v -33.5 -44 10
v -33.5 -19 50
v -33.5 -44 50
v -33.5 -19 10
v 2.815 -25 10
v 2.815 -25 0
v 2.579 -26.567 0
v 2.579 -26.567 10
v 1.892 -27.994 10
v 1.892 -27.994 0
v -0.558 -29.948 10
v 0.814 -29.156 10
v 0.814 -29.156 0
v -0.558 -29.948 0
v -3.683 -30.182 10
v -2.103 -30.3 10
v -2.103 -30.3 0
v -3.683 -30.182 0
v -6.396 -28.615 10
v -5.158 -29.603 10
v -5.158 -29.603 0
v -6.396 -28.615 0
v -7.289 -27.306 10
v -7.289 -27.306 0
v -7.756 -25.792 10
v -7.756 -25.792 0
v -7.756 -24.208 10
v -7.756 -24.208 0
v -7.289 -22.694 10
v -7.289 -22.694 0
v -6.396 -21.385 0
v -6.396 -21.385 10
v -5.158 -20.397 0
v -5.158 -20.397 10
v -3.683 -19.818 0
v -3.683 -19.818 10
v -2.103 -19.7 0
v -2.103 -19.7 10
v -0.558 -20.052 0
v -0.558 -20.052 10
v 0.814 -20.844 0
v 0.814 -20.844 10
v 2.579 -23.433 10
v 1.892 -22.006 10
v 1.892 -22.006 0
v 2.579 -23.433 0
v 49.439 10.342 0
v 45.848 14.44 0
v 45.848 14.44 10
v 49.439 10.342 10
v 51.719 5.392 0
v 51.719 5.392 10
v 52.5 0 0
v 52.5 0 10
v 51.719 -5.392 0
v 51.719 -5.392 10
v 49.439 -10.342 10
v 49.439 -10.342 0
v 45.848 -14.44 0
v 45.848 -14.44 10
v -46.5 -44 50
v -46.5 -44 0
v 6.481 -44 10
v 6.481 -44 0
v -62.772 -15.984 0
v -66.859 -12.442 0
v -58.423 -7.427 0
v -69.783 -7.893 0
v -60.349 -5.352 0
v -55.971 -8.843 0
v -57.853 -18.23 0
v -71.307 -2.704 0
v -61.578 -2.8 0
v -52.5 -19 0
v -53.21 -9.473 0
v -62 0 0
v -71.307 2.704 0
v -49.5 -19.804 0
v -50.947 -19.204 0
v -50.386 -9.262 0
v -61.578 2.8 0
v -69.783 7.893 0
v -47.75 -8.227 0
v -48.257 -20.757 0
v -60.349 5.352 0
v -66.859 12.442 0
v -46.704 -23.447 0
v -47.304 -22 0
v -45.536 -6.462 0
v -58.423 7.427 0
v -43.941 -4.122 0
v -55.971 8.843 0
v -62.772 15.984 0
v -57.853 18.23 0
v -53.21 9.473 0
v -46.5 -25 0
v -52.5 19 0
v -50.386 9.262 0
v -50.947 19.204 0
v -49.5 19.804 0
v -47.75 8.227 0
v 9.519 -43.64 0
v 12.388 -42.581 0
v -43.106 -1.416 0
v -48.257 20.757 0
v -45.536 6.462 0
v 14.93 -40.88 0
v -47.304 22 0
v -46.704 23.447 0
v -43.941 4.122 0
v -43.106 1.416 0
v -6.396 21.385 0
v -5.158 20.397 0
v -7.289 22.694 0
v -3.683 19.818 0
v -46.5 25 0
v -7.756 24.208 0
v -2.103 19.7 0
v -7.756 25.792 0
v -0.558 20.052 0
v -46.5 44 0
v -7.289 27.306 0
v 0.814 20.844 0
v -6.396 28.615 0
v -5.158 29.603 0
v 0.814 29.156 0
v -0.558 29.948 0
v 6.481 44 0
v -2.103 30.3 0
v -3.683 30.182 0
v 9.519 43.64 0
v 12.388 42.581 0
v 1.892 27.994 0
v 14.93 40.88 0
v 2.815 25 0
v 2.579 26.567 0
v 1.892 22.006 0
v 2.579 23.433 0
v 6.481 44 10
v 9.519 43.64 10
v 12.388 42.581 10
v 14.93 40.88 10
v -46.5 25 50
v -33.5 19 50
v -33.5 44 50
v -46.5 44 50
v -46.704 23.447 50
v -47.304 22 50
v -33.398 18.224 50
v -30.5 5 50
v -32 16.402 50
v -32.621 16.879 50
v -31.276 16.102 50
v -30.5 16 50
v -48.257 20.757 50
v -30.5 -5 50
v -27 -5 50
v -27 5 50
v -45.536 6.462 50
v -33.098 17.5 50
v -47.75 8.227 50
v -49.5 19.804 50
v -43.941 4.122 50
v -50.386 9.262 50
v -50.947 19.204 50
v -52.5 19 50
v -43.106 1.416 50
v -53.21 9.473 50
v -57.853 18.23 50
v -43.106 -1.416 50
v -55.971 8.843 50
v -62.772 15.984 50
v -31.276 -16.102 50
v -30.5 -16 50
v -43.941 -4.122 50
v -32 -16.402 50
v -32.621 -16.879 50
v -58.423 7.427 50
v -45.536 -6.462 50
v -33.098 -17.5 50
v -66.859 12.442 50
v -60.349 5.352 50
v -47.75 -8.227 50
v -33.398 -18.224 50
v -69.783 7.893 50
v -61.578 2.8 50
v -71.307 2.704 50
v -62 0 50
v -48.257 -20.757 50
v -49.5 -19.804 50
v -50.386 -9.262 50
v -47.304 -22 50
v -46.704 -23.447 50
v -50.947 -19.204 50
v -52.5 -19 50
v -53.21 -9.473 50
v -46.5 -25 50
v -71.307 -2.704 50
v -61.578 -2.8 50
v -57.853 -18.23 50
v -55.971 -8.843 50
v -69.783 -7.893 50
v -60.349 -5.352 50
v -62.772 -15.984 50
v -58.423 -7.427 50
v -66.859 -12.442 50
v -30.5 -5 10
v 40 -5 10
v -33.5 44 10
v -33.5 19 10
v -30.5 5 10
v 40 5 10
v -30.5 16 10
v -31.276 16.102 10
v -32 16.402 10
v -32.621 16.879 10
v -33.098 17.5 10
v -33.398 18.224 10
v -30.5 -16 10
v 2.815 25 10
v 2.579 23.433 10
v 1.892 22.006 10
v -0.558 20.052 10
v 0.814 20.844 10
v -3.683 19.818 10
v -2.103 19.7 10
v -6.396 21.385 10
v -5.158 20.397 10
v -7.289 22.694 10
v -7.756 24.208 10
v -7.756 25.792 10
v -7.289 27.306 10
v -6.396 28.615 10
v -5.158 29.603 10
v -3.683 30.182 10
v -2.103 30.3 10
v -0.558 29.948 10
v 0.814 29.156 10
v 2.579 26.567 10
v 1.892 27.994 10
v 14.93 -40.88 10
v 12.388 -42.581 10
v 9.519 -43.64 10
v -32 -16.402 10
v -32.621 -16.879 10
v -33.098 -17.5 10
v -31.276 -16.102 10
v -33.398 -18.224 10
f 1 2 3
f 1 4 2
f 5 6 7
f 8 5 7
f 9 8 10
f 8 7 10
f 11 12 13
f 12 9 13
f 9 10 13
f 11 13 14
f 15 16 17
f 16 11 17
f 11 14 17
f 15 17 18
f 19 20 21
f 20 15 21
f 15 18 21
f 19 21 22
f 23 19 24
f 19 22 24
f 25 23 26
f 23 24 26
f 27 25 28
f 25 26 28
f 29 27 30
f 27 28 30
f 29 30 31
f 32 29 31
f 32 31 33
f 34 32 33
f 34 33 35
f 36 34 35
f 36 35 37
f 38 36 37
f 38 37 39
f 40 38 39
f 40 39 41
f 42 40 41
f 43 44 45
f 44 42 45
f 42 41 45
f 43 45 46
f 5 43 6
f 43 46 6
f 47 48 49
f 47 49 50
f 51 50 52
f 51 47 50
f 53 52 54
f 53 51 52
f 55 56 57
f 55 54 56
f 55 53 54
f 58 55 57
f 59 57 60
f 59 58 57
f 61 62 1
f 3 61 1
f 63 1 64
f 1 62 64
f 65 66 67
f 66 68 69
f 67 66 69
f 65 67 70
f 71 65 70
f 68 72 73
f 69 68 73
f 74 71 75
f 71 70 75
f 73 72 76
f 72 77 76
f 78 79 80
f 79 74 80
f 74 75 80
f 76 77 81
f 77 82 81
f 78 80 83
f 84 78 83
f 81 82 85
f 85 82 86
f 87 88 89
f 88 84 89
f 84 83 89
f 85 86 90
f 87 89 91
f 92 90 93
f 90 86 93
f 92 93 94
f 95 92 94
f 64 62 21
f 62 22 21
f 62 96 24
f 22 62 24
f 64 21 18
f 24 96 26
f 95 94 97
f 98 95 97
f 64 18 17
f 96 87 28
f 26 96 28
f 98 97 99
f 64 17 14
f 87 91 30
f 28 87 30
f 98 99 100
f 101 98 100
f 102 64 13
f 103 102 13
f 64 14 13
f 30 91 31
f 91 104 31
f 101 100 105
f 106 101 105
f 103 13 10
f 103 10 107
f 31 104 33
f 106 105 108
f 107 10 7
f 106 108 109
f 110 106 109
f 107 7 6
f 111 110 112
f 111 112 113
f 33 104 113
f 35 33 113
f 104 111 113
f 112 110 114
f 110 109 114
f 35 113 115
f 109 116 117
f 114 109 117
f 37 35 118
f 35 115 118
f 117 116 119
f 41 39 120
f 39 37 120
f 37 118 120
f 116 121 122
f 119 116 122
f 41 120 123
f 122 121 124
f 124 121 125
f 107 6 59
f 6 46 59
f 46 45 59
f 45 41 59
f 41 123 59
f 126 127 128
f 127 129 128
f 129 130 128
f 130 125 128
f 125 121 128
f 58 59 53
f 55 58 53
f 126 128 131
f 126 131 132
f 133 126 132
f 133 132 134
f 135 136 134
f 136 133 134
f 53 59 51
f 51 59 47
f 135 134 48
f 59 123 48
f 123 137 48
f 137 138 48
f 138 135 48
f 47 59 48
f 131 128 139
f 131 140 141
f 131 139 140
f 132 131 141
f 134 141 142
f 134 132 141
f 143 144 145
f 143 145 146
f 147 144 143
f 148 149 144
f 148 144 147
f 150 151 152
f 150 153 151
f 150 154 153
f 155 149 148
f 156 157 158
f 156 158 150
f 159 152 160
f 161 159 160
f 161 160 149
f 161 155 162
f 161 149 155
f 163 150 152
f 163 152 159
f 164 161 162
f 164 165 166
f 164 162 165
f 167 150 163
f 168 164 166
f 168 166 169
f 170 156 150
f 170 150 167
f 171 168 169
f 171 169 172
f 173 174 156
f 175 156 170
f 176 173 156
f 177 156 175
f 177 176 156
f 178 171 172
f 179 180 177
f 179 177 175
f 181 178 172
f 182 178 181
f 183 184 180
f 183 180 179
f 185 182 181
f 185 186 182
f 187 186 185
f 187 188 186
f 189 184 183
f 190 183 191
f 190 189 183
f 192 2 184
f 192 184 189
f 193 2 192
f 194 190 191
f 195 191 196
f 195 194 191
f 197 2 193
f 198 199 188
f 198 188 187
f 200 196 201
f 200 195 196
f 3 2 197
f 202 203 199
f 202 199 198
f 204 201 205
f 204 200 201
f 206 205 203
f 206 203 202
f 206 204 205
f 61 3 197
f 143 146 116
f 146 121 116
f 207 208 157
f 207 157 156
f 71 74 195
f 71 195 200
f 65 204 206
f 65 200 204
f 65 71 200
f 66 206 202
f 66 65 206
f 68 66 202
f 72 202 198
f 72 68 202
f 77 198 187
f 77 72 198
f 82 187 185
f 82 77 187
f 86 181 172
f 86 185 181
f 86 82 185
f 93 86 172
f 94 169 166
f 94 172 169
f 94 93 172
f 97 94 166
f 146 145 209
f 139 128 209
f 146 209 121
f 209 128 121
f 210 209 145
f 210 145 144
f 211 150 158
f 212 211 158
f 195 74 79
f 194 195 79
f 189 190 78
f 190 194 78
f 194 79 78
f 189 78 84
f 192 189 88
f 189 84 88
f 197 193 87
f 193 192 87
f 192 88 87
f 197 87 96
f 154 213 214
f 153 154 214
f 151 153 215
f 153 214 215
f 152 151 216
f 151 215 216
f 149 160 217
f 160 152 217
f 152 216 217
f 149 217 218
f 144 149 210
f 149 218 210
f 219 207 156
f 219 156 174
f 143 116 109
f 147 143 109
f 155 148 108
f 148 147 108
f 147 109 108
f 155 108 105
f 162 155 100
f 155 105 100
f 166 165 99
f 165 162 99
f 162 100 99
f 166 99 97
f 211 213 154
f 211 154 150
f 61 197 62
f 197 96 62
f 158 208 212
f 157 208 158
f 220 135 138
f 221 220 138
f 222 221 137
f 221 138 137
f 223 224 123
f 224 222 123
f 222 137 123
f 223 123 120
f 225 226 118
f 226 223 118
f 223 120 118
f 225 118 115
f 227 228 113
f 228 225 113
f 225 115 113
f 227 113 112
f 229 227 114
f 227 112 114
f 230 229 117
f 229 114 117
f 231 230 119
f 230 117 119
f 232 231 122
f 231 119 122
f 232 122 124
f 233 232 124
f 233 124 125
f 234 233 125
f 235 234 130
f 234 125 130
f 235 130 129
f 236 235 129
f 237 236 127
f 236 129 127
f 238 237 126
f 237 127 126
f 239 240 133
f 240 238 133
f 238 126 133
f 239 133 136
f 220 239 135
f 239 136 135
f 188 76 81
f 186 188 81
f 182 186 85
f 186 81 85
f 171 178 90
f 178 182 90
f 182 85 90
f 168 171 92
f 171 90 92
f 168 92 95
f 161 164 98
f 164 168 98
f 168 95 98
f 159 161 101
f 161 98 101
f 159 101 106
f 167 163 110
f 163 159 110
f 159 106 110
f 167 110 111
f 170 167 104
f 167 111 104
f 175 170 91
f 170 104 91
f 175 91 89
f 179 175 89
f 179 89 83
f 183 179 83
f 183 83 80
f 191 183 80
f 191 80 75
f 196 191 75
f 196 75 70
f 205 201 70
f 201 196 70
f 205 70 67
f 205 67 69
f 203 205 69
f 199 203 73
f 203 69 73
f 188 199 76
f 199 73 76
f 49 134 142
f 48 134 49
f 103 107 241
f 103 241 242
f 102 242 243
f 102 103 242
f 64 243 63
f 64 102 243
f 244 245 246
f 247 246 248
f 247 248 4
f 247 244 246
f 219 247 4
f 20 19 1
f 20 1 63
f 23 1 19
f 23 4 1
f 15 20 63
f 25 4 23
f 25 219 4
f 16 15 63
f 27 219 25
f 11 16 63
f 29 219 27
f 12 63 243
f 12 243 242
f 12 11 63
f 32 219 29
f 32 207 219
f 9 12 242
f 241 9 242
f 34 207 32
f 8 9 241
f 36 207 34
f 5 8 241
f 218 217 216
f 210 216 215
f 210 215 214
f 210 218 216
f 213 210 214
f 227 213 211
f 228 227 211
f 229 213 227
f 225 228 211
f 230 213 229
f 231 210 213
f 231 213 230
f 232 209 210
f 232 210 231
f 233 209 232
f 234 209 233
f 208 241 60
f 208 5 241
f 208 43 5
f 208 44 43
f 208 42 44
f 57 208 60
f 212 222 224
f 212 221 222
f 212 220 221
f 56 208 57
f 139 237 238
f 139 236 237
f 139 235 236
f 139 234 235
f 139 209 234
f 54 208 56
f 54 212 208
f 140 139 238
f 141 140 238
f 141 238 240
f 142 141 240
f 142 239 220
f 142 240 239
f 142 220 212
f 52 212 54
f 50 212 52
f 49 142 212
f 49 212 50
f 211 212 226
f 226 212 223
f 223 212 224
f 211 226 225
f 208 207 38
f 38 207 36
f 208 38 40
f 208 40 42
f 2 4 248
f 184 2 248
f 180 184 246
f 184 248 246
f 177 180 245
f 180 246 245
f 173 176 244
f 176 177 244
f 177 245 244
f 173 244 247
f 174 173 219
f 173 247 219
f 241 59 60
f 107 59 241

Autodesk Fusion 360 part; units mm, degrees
sketch "Base 1" plane through (0, 0, 0) normal (0, 0, 1) x (1, 0, 0)
  line L0 (6.4814, 44) -> (-33.5, 44)
  line L1 (-33.5, 44) -> (-33.5, -44)
  line L2 (-33.5, -44) -> (6.4814, -44)
  line L3 (-33.5, -25) -> (-33.5, 25) construction
  line L4 (45.8485, -14.44) -> (14.9304, -40.88)
  line L5 (33.5, 25) -> (45.8485, 14.44) construction
  line L6 (14.9304, 40.88) -> (45.8485, 14.44)
  arc A0 (6.4814, -44) -> (14.9304, -40.88) centre (6.4814, -31) ccw
  arc A1 (14.9304, 40.88) -> (6.4814, 44) centre (6.4814, 31) ccw
  circle A2 centre (-2.5, -25) radius 5.3151
  circle A3 centre (-2.5, 25) radius 5.3151
  arc A4 (45.8485, -14.44) -> (45.8485, 14.44) centre (33.5, 0) ccw
  dimension "d2" = 88
  dimension "d4" = 50
  dimension "d6" = 38
  dimension "d7" = 13
  dimension "d8" = 13
  dimension "d9" = 31
  dimension "d10" = 10.6301
extrude "Extrude1" add sketch "Base 1" along normal blind 10
sketch "Base 2" plane through (0, 0, 10) normal (0, 0, 1) x (-1, 0, 0)
  circle A0 centre (2.5, 25) radius 5.3151
  circle A1 centre (2.5, -25) radius 5.3151
  arc A2 (-14.9304, -40.88) -> (-6.4814, -44) centre (-6.4814, -31) ccw
  line L0 (-6.4814, -44) -> (33.5, -44)
  line L1 (33.5, -44) -> (33.5, 44)
  line L2 (33.5, 44) -> (-6.4814, 44)
  arc A3 (-6.4814, 44) -> (-14.9304, 40.88) centre (-6.4814, 31) ccw
  line L3 (-14.9304, 40.88) -> (-45.8485, 14.44)
  arc A4 (-45.8485, 14.44) -> (-45.8485, -14.44) centre (-33.5, 0) ccw
  line L4 (-45.8485, -14.44) -> (-14.9304, -40.88)
  line L5 (33.5, -44) -> (46.5, -44)
  line L6 (46.5, -44) -> (46.5, -25)
  line L7 (46.5, 44) -> (33.5, 44)
  line L8 (33.5, 44) -> (33.5, 19)
  line L9 (30.5, 16) -> (30.5, 16)
  line L10 (30.5, -16) -> (30.5, -16)
  arc A5 (30.5, 16) -> (33.5, 19) centre (30.5, 19) ccw
  line L11 (33.5, -44) -> (33.5, -19)
  arc A6 (33.5, -19) -> (30.5, -16) centre (30.5, -19) ccw
  circle A7 centre (52.5, 0) radius 9.5
  line L12 (52.5, -19) -> (52.5, -19) construction
  arc A8 (52.5, -19) -> (46.5, -25) centre (52.5, -25) ccw
  line L13 (46.5, 25) -> (46.5, 44)
  line L14 (52.5, 19) -> (52.5, 19) construction
  arc A9 (46.5, 25) -> (52.5, 19) centre (52.5, 25) ccw
  line L15 (27, -5) -> (30.5, -5) construction
  line L16 (27, 5) -> (27, -5) construction
  line L17 (30.5, -5) -> (27, -5)
  line L18 (27, -5) -> (27, 5)
  line L19 (27, 5) -> (30.5, 5)
  line L20 (30.5, -16) -> (30.5, -5)
  line L21 (30.5, 5) -> (30.5, 16)
  arc A10 (52.5, -19) -> (52.5, 19) centre (52.5, 0) ccw
  line L22 (26.5, -46.8903) -> (26.5, -44) construction
  line L23 (26.5, 44) -> (26.5, 65) construction
  line L24 (30.5, 5) -> (27, 5) construction
  point P0 (30.5, 0)
  dimension "d13" = 13
  dimension "d14" = 88
  dimension "d17" = 3
  dimension "d18" = 3
  dimension "d20" = 19
  dimension "d21" = 38
  dimension "d22" = 6
  dimension "d23" = 6
extrude "Extrude2" add sketch "Base 2" against normal blind 10 contours L1 L5 L6 L7 L8 L11 A8 L13 A9 A10
extrude "Extrude3" add sketch "Base 2" along normal blind 40 contours L1 L5 L6 L7 L8 L11 A8 L13 A9 A10
extrude "Extrude4" add sketch "Base 2" along normal blind 40 contours L1 A5 A6 L17 L18 L19 L20 L21
sketch "Triangle" plane through (0, 0, 0) normal (0, 1, 0) x (1, 0, 0)
  line L0 (-27, -10) -> (40, -10)
  line L1 (40, -10) -> (-27, -50)
  line L2 (-27, -50) -> (-27, -10)
  dimension "d32" = 67
extrude "Extrude5" add sketch "Triangle" along normal mid plane 10
